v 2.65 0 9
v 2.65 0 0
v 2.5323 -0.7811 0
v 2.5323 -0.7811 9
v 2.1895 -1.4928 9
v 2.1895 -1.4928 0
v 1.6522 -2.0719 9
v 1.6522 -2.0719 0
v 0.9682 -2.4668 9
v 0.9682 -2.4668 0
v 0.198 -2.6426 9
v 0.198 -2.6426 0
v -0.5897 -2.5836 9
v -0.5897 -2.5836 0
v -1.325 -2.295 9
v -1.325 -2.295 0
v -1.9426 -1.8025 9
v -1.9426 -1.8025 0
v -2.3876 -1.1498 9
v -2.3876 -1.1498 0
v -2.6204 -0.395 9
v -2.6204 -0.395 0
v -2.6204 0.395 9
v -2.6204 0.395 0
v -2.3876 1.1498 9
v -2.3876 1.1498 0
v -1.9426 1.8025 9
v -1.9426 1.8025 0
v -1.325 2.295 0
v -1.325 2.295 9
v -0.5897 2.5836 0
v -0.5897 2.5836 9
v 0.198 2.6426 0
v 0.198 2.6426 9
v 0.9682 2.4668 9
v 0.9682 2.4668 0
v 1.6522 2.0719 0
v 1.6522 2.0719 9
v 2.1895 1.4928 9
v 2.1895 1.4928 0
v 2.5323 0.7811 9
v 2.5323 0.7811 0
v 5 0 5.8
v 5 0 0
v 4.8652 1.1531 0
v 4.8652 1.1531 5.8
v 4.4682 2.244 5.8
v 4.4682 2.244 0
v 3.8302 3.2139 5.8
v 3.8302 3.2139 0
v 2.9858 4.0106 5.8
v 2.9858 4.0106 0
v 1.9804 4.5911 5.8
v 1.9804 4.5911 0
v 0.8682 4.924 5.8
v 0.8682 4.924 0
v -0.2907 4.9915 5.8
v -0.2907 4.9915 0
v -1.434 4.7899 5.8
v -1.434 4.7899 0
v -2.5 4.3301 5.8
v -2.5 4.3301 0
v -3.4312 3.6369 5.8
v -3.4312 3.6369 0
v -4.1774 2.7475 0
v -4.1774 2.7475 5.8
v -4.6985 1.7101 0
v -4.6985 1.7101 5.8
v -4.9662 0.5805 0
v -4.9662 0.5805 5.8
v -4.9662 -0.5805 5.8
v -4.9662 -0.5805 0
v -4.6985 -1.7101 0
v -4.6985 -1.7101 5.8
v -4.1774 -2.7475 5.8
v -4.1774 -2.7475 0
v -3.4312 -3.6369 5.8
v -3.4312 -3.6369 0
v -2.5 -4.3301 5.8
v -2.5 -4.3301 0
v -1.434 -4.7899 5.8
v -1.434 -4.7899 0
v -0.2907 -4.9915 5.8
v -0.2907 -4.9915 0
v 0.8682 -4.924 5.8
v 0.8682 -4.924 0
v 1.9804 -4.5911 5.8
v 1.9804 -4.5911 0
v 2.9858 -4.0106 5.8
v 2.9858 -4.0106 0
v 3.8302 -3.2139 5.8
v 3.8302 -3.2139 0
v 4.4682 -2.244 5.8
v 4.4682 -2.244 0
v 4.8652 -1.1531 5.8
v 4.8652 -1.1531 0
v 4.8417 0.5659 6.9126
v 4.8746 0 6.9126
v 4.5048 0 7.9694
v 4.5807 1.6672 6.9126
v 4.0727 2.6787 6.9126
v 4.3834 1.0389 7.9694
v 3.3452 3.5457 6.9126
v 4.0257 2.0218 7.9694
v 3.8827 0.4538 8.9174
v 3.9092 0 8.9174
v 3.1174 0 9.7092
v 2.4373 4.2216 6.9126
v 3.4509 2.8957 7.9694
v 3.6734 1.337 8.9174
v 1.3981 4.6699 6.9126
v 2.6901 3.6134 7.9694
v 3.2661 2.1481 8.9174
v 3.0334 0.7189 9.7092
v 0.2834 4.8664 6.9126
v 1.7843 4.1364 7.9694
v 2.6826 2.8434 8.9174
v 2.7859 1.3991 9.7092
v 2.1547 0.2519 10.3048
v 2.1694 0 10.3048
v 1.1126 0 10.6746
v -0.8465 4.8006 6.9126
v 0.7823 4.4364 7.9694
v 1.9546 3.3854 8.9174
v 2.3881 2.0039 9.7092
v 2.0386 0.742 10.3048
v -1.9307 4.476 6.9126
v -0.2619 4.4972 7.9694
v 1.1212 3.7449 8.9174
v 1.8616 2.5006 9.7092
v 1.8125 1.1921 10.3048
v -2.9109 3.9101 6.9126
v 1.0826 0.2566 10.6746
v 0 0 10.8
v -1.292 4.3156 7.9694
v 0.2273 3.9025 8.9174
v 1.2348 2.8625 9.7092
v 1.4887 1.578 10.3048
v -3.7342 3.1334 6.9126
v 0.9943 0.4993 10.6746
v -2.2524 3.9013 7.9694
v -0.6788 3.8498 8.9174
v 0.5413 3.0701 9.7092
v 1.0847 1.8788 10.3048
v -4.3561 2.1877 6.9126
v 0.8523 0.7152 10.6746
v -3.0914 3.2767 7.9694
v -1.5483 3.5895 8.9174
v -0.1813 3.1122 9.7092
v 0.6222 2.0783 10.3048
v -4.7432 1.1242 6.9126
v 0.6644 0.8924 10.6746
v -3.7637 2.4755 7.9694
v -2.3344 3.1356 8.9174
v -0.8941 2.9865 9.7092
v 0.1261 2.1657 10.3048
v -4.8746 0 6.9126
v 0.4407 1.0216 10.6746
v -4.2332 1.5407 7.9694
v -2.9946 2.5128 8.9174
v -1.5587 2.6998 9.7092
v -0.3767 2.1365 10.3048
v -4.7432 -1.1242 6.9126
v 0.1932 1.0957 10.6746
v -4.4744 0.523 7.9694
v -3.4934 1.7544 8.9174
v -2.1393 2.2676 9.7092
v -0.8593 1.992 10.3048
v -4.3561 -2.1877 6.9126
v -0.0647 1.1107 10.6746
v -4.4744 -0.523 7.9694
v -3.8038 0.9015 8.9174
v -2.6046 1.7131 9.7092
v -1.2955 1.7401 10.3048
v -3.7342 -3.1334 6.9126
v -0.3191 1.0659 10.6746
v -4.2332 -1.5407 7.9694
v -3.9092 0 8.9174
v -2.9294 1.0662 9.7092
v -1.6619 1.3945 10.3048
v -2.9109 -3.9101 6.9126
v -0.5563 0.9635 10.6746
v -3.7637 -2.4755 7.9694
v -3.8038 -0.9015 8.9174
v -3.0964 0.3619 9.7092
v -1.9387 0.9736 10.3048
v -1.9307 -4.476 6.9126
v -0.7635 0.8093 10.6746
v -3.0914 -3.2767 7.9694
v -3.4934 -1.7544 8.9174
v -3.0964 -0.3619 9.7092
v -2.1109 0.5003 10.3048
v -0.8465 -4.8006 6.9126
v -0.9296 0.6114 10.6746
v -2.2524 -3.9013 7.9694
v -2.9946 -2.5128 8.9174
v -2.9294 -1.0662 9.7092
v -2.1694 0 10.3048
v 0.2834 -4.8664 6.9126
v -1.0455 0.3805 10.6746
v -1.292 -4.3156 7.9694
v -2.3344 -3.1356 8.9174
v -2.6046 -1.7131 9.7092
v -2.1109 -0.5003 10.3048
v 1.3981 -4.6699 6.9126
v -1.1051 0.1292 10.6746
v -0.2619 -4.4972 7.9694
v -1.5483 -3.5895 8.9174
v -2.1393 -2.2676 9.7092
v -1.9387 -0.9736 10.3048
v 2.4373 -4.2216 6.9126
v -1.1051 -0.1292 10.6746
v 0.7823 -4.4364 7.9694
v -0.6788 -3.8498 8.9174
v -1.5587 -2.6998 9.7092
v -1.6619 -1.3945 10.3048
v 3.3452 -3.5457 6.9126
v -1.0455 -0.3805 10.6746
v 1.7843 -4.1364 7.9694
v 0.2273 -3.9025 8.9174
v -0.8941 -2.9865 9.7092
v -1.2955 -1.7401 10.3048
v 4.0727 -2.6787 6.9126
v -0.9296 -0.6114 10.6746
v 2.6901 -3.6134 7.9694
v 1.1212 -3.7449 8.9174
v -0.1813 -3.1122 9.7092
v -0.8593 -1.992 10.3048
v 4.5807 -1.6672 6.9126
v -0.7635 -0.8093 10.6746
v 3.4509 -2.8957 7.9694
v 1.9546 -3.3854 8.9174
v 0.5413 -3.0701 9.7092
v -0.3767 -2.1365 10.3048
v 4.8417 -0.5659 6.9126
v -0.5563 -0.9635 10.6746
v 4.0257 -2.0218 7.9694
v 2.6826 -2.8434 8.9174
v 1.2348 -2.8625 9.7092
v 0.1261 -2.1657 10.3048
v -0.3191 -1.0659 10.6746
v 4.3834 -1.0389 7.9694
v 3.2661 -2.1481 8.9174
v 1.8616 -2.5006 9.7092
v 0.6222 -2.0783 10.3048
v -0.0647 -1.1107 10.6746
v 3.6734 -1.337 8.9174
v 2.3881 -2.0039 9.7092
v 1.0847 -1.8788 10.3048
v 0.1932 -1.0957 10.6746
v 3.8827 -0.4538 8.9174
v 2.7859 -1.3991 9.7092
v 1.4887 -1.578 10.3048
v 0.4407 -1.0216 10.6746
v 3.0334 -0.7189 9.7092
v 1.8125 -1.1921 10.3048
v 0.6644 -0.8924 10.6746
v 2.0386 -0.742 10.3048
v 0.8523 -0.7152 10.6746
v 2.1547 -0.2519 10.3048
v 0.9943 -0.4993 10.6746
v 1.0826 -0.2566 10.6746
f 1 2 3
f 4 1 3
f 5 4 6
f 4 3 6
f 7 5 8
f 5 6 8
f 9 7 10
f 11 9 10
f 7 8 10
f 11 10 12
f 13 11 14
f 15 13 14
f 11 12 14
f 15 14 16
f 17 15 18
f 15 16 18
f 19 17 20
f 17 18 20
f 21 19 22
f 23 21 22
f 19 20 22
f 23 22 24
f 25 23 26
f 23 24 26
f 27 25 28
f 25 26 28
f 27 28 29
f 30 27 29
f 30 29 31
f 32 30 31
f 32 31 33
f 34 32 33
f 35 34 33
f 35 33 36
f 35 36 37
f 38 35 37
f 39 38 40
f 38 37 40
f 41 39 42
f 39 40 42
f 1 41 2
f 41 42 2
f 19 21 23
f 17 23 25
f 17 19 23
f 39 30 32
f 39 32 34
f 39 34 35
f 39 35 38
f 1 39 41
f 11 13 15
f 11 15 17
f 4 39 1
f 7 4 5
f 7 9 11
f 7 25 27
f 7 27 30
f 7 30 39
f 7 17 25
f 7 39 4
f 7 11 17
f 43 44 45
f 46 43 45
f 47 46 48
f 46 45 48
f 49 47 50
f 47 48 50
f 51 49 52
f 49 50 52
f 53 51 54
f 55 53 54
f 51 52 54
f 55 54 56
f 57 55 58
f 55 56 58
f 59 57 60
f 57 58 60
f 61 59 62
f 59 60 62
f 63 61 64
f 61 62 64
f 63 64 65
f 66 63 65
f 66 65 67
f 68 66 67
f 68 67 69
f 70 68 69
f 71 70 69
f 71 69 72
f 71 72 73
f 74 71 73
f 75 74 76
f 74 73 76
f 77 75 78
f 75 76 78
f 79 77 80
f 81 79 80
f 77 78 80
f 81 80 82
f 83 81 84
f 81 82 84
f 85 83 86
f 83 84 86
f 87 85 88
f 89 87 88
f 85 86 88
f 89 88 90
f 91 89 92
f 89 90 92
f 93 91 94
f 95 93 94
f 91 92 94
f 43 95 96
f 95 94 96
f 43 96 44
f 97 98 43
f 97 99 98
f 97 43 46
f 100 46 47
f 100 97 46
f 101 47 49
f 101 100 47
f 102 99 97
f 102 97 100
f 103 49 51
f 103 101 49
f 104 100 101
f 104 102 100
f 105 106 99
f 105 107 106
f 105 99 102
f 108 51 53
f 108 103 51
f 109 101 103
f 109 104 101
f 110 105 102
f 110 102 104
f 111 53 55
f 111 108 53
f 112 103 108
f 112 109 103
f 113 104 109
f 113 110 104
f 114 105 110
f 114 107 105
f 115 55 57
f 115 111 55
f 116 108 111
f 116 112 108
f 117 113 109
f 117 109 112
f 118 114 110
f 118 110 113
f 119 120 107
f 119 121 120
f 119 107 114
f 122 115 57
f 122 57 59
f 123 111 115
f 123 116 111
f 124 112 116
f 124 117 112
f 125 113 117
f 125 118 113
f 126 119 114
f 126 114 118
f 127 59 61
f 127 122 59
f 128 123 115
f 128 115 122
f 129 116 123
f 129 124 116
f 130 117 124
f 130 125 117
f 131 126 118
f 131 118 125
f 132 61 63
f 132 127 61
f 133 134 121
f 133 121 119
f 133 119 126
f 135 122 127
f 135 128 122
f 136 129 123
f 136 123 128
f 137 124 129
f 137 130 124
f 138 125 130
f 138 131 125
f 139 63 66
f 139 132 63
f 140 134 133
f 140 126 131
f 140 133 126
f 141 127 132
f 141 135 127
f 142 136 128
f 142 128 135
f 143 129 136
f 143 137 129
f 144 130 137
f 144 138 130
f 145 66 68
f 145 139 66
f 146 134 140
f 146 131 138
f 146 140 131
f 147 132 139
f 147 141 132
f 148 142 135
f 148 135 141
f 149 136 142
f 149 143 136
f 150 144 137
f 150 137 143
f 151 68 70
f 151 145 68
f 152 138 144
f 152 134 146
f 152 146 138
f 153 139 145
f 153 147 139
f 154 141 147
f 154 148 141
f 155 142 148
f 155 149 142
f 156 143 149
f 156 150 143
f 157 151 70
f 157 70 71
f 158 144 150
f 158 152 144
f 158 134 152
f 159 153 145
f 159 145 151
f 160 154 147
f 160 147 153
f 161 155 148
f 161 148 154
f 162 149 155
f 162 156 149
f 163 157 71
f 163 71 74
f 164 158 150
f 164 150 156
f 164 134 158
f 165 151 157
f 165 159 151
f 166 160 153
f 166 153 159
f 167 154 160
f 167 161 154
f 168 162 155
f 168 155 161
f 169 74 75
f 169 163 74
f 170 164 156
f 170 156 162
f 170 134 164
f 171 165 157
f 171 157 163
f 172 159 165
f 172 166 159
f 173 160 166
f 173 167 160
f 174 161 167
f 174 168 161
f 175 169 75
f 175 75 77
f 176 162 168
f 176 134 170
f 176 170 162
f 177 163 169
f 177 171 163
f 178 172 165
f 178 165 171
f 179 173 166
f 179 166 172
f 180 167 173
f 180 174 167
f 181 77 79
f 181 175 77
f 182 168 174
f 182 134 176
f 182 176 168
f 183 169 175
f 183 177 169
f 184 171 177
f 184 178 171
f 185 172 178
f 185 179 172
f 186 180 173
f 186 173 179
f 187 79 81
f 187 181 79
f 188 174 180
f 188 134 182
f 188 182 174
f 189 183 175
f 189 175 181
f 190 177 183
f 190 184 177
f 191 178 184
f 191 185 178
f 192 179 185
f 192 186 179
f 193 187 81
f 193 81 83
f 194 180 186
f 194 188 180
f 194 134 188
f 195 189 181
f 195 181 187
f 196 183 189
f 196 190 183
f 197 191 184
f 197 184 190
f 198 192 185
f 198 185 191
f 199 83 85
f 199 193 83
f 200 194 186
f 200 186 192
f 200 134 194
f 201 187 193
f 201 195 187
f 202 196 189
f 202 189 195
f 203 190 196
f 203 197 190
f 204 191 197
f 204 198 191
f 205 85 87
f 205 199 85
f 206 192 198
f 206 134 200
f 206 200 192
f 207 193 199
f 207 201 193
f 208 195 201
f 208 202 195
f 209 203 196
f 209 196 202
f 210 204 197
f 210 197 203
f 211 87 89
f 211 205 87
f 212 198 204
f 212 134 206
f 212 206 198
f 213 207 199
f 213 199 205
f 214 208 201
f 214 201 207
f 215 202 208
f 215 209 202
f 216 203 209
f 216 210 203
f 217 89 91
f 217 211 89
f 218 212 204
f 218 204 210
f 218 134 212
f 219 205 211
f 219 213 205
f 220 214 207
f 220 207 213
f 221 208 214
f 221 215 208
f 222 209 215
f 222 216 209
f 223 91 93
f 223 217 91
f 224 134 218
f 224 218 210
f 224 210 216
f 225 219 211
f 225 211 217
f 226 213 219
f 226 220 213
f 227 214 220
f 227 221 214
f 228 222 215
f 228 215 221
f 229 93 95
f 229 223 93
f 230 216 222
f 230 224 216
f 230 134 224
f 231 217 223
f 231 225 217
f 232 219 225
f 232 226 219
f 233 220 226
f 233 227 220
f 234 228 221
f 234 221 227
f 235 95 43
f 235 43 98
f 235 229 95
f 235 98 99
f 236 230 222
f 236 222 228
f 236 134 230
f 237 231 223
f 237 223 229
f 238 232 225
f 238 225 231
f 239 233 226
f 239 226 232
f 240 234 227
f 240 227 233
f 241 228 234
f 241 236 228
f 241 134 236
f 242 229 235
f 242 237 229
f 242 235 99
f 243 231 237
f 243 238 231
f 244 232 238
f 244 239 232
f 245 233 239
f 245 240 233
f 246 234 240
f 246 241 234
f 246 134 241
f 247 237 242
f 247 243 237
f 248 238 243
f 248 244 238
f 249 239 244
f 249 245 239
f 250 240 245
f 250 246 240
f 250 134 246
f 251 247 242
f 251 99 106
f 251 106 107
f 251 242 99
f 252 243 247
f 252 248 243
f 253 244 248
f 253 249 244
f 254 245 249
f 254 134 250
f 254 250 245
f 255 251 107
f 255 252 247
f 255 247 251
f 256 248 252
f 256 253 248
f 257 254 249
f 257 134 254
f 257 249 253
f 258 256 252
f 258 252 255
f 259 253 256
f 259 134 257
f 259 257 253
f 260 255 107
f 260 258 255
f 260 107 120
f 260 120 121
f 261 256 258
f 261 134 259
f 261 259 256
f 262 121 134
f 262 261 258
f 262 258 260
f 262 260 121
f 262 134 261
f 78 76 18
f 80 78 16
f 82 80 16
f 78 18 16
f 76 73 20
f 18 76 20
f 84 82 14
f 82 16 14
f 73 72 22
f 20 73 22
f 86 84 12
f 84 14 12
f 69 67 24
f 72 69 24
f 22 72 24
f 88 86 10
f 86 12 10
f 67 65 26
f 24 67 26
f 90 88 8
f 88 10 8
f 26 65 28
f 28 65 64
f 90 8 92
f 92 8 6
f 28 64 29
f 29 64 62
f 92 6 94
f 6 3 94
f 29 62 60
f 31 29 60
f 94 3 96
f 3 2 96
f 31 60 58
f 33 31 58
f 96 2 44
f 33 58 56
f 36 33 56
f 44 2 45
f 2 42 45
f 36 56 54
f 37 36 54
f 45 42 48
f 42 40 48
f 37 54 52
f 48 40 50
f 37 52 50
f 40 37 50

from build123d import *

# Parameters (mm, degrees)
F0_R     = 5
F1_DEPTH = 10.8
F2_R     = 5
F3_R     = 2.65
F4_DEPTH = 9


with BuildPart() as f1:
    # F0 (on Top) → F1 (new body)
    with BuildSketch(Plane.XY):
        Circle(F0_R)
    extrude(amount=F1_DEPTH)

    # F2
    f2_edges = [f1.edges().sort_by_distance(p)[0] for p in [
        (-5, 0, 10.8),
    ]]
    fillet(f2_edges, radius=F2_R)

    # F3 (on face) → F4 (cut)
    with BuildSketch(Plane(origin=(0, 0, 0), x_dir=(1, 0, 0), z_dir=(0, 0, -1))):
        Circle(F3_R)
    extrude(amount=-F4_DEPTH, mode=Mode.SUBTRACT)


solid = f1.part
